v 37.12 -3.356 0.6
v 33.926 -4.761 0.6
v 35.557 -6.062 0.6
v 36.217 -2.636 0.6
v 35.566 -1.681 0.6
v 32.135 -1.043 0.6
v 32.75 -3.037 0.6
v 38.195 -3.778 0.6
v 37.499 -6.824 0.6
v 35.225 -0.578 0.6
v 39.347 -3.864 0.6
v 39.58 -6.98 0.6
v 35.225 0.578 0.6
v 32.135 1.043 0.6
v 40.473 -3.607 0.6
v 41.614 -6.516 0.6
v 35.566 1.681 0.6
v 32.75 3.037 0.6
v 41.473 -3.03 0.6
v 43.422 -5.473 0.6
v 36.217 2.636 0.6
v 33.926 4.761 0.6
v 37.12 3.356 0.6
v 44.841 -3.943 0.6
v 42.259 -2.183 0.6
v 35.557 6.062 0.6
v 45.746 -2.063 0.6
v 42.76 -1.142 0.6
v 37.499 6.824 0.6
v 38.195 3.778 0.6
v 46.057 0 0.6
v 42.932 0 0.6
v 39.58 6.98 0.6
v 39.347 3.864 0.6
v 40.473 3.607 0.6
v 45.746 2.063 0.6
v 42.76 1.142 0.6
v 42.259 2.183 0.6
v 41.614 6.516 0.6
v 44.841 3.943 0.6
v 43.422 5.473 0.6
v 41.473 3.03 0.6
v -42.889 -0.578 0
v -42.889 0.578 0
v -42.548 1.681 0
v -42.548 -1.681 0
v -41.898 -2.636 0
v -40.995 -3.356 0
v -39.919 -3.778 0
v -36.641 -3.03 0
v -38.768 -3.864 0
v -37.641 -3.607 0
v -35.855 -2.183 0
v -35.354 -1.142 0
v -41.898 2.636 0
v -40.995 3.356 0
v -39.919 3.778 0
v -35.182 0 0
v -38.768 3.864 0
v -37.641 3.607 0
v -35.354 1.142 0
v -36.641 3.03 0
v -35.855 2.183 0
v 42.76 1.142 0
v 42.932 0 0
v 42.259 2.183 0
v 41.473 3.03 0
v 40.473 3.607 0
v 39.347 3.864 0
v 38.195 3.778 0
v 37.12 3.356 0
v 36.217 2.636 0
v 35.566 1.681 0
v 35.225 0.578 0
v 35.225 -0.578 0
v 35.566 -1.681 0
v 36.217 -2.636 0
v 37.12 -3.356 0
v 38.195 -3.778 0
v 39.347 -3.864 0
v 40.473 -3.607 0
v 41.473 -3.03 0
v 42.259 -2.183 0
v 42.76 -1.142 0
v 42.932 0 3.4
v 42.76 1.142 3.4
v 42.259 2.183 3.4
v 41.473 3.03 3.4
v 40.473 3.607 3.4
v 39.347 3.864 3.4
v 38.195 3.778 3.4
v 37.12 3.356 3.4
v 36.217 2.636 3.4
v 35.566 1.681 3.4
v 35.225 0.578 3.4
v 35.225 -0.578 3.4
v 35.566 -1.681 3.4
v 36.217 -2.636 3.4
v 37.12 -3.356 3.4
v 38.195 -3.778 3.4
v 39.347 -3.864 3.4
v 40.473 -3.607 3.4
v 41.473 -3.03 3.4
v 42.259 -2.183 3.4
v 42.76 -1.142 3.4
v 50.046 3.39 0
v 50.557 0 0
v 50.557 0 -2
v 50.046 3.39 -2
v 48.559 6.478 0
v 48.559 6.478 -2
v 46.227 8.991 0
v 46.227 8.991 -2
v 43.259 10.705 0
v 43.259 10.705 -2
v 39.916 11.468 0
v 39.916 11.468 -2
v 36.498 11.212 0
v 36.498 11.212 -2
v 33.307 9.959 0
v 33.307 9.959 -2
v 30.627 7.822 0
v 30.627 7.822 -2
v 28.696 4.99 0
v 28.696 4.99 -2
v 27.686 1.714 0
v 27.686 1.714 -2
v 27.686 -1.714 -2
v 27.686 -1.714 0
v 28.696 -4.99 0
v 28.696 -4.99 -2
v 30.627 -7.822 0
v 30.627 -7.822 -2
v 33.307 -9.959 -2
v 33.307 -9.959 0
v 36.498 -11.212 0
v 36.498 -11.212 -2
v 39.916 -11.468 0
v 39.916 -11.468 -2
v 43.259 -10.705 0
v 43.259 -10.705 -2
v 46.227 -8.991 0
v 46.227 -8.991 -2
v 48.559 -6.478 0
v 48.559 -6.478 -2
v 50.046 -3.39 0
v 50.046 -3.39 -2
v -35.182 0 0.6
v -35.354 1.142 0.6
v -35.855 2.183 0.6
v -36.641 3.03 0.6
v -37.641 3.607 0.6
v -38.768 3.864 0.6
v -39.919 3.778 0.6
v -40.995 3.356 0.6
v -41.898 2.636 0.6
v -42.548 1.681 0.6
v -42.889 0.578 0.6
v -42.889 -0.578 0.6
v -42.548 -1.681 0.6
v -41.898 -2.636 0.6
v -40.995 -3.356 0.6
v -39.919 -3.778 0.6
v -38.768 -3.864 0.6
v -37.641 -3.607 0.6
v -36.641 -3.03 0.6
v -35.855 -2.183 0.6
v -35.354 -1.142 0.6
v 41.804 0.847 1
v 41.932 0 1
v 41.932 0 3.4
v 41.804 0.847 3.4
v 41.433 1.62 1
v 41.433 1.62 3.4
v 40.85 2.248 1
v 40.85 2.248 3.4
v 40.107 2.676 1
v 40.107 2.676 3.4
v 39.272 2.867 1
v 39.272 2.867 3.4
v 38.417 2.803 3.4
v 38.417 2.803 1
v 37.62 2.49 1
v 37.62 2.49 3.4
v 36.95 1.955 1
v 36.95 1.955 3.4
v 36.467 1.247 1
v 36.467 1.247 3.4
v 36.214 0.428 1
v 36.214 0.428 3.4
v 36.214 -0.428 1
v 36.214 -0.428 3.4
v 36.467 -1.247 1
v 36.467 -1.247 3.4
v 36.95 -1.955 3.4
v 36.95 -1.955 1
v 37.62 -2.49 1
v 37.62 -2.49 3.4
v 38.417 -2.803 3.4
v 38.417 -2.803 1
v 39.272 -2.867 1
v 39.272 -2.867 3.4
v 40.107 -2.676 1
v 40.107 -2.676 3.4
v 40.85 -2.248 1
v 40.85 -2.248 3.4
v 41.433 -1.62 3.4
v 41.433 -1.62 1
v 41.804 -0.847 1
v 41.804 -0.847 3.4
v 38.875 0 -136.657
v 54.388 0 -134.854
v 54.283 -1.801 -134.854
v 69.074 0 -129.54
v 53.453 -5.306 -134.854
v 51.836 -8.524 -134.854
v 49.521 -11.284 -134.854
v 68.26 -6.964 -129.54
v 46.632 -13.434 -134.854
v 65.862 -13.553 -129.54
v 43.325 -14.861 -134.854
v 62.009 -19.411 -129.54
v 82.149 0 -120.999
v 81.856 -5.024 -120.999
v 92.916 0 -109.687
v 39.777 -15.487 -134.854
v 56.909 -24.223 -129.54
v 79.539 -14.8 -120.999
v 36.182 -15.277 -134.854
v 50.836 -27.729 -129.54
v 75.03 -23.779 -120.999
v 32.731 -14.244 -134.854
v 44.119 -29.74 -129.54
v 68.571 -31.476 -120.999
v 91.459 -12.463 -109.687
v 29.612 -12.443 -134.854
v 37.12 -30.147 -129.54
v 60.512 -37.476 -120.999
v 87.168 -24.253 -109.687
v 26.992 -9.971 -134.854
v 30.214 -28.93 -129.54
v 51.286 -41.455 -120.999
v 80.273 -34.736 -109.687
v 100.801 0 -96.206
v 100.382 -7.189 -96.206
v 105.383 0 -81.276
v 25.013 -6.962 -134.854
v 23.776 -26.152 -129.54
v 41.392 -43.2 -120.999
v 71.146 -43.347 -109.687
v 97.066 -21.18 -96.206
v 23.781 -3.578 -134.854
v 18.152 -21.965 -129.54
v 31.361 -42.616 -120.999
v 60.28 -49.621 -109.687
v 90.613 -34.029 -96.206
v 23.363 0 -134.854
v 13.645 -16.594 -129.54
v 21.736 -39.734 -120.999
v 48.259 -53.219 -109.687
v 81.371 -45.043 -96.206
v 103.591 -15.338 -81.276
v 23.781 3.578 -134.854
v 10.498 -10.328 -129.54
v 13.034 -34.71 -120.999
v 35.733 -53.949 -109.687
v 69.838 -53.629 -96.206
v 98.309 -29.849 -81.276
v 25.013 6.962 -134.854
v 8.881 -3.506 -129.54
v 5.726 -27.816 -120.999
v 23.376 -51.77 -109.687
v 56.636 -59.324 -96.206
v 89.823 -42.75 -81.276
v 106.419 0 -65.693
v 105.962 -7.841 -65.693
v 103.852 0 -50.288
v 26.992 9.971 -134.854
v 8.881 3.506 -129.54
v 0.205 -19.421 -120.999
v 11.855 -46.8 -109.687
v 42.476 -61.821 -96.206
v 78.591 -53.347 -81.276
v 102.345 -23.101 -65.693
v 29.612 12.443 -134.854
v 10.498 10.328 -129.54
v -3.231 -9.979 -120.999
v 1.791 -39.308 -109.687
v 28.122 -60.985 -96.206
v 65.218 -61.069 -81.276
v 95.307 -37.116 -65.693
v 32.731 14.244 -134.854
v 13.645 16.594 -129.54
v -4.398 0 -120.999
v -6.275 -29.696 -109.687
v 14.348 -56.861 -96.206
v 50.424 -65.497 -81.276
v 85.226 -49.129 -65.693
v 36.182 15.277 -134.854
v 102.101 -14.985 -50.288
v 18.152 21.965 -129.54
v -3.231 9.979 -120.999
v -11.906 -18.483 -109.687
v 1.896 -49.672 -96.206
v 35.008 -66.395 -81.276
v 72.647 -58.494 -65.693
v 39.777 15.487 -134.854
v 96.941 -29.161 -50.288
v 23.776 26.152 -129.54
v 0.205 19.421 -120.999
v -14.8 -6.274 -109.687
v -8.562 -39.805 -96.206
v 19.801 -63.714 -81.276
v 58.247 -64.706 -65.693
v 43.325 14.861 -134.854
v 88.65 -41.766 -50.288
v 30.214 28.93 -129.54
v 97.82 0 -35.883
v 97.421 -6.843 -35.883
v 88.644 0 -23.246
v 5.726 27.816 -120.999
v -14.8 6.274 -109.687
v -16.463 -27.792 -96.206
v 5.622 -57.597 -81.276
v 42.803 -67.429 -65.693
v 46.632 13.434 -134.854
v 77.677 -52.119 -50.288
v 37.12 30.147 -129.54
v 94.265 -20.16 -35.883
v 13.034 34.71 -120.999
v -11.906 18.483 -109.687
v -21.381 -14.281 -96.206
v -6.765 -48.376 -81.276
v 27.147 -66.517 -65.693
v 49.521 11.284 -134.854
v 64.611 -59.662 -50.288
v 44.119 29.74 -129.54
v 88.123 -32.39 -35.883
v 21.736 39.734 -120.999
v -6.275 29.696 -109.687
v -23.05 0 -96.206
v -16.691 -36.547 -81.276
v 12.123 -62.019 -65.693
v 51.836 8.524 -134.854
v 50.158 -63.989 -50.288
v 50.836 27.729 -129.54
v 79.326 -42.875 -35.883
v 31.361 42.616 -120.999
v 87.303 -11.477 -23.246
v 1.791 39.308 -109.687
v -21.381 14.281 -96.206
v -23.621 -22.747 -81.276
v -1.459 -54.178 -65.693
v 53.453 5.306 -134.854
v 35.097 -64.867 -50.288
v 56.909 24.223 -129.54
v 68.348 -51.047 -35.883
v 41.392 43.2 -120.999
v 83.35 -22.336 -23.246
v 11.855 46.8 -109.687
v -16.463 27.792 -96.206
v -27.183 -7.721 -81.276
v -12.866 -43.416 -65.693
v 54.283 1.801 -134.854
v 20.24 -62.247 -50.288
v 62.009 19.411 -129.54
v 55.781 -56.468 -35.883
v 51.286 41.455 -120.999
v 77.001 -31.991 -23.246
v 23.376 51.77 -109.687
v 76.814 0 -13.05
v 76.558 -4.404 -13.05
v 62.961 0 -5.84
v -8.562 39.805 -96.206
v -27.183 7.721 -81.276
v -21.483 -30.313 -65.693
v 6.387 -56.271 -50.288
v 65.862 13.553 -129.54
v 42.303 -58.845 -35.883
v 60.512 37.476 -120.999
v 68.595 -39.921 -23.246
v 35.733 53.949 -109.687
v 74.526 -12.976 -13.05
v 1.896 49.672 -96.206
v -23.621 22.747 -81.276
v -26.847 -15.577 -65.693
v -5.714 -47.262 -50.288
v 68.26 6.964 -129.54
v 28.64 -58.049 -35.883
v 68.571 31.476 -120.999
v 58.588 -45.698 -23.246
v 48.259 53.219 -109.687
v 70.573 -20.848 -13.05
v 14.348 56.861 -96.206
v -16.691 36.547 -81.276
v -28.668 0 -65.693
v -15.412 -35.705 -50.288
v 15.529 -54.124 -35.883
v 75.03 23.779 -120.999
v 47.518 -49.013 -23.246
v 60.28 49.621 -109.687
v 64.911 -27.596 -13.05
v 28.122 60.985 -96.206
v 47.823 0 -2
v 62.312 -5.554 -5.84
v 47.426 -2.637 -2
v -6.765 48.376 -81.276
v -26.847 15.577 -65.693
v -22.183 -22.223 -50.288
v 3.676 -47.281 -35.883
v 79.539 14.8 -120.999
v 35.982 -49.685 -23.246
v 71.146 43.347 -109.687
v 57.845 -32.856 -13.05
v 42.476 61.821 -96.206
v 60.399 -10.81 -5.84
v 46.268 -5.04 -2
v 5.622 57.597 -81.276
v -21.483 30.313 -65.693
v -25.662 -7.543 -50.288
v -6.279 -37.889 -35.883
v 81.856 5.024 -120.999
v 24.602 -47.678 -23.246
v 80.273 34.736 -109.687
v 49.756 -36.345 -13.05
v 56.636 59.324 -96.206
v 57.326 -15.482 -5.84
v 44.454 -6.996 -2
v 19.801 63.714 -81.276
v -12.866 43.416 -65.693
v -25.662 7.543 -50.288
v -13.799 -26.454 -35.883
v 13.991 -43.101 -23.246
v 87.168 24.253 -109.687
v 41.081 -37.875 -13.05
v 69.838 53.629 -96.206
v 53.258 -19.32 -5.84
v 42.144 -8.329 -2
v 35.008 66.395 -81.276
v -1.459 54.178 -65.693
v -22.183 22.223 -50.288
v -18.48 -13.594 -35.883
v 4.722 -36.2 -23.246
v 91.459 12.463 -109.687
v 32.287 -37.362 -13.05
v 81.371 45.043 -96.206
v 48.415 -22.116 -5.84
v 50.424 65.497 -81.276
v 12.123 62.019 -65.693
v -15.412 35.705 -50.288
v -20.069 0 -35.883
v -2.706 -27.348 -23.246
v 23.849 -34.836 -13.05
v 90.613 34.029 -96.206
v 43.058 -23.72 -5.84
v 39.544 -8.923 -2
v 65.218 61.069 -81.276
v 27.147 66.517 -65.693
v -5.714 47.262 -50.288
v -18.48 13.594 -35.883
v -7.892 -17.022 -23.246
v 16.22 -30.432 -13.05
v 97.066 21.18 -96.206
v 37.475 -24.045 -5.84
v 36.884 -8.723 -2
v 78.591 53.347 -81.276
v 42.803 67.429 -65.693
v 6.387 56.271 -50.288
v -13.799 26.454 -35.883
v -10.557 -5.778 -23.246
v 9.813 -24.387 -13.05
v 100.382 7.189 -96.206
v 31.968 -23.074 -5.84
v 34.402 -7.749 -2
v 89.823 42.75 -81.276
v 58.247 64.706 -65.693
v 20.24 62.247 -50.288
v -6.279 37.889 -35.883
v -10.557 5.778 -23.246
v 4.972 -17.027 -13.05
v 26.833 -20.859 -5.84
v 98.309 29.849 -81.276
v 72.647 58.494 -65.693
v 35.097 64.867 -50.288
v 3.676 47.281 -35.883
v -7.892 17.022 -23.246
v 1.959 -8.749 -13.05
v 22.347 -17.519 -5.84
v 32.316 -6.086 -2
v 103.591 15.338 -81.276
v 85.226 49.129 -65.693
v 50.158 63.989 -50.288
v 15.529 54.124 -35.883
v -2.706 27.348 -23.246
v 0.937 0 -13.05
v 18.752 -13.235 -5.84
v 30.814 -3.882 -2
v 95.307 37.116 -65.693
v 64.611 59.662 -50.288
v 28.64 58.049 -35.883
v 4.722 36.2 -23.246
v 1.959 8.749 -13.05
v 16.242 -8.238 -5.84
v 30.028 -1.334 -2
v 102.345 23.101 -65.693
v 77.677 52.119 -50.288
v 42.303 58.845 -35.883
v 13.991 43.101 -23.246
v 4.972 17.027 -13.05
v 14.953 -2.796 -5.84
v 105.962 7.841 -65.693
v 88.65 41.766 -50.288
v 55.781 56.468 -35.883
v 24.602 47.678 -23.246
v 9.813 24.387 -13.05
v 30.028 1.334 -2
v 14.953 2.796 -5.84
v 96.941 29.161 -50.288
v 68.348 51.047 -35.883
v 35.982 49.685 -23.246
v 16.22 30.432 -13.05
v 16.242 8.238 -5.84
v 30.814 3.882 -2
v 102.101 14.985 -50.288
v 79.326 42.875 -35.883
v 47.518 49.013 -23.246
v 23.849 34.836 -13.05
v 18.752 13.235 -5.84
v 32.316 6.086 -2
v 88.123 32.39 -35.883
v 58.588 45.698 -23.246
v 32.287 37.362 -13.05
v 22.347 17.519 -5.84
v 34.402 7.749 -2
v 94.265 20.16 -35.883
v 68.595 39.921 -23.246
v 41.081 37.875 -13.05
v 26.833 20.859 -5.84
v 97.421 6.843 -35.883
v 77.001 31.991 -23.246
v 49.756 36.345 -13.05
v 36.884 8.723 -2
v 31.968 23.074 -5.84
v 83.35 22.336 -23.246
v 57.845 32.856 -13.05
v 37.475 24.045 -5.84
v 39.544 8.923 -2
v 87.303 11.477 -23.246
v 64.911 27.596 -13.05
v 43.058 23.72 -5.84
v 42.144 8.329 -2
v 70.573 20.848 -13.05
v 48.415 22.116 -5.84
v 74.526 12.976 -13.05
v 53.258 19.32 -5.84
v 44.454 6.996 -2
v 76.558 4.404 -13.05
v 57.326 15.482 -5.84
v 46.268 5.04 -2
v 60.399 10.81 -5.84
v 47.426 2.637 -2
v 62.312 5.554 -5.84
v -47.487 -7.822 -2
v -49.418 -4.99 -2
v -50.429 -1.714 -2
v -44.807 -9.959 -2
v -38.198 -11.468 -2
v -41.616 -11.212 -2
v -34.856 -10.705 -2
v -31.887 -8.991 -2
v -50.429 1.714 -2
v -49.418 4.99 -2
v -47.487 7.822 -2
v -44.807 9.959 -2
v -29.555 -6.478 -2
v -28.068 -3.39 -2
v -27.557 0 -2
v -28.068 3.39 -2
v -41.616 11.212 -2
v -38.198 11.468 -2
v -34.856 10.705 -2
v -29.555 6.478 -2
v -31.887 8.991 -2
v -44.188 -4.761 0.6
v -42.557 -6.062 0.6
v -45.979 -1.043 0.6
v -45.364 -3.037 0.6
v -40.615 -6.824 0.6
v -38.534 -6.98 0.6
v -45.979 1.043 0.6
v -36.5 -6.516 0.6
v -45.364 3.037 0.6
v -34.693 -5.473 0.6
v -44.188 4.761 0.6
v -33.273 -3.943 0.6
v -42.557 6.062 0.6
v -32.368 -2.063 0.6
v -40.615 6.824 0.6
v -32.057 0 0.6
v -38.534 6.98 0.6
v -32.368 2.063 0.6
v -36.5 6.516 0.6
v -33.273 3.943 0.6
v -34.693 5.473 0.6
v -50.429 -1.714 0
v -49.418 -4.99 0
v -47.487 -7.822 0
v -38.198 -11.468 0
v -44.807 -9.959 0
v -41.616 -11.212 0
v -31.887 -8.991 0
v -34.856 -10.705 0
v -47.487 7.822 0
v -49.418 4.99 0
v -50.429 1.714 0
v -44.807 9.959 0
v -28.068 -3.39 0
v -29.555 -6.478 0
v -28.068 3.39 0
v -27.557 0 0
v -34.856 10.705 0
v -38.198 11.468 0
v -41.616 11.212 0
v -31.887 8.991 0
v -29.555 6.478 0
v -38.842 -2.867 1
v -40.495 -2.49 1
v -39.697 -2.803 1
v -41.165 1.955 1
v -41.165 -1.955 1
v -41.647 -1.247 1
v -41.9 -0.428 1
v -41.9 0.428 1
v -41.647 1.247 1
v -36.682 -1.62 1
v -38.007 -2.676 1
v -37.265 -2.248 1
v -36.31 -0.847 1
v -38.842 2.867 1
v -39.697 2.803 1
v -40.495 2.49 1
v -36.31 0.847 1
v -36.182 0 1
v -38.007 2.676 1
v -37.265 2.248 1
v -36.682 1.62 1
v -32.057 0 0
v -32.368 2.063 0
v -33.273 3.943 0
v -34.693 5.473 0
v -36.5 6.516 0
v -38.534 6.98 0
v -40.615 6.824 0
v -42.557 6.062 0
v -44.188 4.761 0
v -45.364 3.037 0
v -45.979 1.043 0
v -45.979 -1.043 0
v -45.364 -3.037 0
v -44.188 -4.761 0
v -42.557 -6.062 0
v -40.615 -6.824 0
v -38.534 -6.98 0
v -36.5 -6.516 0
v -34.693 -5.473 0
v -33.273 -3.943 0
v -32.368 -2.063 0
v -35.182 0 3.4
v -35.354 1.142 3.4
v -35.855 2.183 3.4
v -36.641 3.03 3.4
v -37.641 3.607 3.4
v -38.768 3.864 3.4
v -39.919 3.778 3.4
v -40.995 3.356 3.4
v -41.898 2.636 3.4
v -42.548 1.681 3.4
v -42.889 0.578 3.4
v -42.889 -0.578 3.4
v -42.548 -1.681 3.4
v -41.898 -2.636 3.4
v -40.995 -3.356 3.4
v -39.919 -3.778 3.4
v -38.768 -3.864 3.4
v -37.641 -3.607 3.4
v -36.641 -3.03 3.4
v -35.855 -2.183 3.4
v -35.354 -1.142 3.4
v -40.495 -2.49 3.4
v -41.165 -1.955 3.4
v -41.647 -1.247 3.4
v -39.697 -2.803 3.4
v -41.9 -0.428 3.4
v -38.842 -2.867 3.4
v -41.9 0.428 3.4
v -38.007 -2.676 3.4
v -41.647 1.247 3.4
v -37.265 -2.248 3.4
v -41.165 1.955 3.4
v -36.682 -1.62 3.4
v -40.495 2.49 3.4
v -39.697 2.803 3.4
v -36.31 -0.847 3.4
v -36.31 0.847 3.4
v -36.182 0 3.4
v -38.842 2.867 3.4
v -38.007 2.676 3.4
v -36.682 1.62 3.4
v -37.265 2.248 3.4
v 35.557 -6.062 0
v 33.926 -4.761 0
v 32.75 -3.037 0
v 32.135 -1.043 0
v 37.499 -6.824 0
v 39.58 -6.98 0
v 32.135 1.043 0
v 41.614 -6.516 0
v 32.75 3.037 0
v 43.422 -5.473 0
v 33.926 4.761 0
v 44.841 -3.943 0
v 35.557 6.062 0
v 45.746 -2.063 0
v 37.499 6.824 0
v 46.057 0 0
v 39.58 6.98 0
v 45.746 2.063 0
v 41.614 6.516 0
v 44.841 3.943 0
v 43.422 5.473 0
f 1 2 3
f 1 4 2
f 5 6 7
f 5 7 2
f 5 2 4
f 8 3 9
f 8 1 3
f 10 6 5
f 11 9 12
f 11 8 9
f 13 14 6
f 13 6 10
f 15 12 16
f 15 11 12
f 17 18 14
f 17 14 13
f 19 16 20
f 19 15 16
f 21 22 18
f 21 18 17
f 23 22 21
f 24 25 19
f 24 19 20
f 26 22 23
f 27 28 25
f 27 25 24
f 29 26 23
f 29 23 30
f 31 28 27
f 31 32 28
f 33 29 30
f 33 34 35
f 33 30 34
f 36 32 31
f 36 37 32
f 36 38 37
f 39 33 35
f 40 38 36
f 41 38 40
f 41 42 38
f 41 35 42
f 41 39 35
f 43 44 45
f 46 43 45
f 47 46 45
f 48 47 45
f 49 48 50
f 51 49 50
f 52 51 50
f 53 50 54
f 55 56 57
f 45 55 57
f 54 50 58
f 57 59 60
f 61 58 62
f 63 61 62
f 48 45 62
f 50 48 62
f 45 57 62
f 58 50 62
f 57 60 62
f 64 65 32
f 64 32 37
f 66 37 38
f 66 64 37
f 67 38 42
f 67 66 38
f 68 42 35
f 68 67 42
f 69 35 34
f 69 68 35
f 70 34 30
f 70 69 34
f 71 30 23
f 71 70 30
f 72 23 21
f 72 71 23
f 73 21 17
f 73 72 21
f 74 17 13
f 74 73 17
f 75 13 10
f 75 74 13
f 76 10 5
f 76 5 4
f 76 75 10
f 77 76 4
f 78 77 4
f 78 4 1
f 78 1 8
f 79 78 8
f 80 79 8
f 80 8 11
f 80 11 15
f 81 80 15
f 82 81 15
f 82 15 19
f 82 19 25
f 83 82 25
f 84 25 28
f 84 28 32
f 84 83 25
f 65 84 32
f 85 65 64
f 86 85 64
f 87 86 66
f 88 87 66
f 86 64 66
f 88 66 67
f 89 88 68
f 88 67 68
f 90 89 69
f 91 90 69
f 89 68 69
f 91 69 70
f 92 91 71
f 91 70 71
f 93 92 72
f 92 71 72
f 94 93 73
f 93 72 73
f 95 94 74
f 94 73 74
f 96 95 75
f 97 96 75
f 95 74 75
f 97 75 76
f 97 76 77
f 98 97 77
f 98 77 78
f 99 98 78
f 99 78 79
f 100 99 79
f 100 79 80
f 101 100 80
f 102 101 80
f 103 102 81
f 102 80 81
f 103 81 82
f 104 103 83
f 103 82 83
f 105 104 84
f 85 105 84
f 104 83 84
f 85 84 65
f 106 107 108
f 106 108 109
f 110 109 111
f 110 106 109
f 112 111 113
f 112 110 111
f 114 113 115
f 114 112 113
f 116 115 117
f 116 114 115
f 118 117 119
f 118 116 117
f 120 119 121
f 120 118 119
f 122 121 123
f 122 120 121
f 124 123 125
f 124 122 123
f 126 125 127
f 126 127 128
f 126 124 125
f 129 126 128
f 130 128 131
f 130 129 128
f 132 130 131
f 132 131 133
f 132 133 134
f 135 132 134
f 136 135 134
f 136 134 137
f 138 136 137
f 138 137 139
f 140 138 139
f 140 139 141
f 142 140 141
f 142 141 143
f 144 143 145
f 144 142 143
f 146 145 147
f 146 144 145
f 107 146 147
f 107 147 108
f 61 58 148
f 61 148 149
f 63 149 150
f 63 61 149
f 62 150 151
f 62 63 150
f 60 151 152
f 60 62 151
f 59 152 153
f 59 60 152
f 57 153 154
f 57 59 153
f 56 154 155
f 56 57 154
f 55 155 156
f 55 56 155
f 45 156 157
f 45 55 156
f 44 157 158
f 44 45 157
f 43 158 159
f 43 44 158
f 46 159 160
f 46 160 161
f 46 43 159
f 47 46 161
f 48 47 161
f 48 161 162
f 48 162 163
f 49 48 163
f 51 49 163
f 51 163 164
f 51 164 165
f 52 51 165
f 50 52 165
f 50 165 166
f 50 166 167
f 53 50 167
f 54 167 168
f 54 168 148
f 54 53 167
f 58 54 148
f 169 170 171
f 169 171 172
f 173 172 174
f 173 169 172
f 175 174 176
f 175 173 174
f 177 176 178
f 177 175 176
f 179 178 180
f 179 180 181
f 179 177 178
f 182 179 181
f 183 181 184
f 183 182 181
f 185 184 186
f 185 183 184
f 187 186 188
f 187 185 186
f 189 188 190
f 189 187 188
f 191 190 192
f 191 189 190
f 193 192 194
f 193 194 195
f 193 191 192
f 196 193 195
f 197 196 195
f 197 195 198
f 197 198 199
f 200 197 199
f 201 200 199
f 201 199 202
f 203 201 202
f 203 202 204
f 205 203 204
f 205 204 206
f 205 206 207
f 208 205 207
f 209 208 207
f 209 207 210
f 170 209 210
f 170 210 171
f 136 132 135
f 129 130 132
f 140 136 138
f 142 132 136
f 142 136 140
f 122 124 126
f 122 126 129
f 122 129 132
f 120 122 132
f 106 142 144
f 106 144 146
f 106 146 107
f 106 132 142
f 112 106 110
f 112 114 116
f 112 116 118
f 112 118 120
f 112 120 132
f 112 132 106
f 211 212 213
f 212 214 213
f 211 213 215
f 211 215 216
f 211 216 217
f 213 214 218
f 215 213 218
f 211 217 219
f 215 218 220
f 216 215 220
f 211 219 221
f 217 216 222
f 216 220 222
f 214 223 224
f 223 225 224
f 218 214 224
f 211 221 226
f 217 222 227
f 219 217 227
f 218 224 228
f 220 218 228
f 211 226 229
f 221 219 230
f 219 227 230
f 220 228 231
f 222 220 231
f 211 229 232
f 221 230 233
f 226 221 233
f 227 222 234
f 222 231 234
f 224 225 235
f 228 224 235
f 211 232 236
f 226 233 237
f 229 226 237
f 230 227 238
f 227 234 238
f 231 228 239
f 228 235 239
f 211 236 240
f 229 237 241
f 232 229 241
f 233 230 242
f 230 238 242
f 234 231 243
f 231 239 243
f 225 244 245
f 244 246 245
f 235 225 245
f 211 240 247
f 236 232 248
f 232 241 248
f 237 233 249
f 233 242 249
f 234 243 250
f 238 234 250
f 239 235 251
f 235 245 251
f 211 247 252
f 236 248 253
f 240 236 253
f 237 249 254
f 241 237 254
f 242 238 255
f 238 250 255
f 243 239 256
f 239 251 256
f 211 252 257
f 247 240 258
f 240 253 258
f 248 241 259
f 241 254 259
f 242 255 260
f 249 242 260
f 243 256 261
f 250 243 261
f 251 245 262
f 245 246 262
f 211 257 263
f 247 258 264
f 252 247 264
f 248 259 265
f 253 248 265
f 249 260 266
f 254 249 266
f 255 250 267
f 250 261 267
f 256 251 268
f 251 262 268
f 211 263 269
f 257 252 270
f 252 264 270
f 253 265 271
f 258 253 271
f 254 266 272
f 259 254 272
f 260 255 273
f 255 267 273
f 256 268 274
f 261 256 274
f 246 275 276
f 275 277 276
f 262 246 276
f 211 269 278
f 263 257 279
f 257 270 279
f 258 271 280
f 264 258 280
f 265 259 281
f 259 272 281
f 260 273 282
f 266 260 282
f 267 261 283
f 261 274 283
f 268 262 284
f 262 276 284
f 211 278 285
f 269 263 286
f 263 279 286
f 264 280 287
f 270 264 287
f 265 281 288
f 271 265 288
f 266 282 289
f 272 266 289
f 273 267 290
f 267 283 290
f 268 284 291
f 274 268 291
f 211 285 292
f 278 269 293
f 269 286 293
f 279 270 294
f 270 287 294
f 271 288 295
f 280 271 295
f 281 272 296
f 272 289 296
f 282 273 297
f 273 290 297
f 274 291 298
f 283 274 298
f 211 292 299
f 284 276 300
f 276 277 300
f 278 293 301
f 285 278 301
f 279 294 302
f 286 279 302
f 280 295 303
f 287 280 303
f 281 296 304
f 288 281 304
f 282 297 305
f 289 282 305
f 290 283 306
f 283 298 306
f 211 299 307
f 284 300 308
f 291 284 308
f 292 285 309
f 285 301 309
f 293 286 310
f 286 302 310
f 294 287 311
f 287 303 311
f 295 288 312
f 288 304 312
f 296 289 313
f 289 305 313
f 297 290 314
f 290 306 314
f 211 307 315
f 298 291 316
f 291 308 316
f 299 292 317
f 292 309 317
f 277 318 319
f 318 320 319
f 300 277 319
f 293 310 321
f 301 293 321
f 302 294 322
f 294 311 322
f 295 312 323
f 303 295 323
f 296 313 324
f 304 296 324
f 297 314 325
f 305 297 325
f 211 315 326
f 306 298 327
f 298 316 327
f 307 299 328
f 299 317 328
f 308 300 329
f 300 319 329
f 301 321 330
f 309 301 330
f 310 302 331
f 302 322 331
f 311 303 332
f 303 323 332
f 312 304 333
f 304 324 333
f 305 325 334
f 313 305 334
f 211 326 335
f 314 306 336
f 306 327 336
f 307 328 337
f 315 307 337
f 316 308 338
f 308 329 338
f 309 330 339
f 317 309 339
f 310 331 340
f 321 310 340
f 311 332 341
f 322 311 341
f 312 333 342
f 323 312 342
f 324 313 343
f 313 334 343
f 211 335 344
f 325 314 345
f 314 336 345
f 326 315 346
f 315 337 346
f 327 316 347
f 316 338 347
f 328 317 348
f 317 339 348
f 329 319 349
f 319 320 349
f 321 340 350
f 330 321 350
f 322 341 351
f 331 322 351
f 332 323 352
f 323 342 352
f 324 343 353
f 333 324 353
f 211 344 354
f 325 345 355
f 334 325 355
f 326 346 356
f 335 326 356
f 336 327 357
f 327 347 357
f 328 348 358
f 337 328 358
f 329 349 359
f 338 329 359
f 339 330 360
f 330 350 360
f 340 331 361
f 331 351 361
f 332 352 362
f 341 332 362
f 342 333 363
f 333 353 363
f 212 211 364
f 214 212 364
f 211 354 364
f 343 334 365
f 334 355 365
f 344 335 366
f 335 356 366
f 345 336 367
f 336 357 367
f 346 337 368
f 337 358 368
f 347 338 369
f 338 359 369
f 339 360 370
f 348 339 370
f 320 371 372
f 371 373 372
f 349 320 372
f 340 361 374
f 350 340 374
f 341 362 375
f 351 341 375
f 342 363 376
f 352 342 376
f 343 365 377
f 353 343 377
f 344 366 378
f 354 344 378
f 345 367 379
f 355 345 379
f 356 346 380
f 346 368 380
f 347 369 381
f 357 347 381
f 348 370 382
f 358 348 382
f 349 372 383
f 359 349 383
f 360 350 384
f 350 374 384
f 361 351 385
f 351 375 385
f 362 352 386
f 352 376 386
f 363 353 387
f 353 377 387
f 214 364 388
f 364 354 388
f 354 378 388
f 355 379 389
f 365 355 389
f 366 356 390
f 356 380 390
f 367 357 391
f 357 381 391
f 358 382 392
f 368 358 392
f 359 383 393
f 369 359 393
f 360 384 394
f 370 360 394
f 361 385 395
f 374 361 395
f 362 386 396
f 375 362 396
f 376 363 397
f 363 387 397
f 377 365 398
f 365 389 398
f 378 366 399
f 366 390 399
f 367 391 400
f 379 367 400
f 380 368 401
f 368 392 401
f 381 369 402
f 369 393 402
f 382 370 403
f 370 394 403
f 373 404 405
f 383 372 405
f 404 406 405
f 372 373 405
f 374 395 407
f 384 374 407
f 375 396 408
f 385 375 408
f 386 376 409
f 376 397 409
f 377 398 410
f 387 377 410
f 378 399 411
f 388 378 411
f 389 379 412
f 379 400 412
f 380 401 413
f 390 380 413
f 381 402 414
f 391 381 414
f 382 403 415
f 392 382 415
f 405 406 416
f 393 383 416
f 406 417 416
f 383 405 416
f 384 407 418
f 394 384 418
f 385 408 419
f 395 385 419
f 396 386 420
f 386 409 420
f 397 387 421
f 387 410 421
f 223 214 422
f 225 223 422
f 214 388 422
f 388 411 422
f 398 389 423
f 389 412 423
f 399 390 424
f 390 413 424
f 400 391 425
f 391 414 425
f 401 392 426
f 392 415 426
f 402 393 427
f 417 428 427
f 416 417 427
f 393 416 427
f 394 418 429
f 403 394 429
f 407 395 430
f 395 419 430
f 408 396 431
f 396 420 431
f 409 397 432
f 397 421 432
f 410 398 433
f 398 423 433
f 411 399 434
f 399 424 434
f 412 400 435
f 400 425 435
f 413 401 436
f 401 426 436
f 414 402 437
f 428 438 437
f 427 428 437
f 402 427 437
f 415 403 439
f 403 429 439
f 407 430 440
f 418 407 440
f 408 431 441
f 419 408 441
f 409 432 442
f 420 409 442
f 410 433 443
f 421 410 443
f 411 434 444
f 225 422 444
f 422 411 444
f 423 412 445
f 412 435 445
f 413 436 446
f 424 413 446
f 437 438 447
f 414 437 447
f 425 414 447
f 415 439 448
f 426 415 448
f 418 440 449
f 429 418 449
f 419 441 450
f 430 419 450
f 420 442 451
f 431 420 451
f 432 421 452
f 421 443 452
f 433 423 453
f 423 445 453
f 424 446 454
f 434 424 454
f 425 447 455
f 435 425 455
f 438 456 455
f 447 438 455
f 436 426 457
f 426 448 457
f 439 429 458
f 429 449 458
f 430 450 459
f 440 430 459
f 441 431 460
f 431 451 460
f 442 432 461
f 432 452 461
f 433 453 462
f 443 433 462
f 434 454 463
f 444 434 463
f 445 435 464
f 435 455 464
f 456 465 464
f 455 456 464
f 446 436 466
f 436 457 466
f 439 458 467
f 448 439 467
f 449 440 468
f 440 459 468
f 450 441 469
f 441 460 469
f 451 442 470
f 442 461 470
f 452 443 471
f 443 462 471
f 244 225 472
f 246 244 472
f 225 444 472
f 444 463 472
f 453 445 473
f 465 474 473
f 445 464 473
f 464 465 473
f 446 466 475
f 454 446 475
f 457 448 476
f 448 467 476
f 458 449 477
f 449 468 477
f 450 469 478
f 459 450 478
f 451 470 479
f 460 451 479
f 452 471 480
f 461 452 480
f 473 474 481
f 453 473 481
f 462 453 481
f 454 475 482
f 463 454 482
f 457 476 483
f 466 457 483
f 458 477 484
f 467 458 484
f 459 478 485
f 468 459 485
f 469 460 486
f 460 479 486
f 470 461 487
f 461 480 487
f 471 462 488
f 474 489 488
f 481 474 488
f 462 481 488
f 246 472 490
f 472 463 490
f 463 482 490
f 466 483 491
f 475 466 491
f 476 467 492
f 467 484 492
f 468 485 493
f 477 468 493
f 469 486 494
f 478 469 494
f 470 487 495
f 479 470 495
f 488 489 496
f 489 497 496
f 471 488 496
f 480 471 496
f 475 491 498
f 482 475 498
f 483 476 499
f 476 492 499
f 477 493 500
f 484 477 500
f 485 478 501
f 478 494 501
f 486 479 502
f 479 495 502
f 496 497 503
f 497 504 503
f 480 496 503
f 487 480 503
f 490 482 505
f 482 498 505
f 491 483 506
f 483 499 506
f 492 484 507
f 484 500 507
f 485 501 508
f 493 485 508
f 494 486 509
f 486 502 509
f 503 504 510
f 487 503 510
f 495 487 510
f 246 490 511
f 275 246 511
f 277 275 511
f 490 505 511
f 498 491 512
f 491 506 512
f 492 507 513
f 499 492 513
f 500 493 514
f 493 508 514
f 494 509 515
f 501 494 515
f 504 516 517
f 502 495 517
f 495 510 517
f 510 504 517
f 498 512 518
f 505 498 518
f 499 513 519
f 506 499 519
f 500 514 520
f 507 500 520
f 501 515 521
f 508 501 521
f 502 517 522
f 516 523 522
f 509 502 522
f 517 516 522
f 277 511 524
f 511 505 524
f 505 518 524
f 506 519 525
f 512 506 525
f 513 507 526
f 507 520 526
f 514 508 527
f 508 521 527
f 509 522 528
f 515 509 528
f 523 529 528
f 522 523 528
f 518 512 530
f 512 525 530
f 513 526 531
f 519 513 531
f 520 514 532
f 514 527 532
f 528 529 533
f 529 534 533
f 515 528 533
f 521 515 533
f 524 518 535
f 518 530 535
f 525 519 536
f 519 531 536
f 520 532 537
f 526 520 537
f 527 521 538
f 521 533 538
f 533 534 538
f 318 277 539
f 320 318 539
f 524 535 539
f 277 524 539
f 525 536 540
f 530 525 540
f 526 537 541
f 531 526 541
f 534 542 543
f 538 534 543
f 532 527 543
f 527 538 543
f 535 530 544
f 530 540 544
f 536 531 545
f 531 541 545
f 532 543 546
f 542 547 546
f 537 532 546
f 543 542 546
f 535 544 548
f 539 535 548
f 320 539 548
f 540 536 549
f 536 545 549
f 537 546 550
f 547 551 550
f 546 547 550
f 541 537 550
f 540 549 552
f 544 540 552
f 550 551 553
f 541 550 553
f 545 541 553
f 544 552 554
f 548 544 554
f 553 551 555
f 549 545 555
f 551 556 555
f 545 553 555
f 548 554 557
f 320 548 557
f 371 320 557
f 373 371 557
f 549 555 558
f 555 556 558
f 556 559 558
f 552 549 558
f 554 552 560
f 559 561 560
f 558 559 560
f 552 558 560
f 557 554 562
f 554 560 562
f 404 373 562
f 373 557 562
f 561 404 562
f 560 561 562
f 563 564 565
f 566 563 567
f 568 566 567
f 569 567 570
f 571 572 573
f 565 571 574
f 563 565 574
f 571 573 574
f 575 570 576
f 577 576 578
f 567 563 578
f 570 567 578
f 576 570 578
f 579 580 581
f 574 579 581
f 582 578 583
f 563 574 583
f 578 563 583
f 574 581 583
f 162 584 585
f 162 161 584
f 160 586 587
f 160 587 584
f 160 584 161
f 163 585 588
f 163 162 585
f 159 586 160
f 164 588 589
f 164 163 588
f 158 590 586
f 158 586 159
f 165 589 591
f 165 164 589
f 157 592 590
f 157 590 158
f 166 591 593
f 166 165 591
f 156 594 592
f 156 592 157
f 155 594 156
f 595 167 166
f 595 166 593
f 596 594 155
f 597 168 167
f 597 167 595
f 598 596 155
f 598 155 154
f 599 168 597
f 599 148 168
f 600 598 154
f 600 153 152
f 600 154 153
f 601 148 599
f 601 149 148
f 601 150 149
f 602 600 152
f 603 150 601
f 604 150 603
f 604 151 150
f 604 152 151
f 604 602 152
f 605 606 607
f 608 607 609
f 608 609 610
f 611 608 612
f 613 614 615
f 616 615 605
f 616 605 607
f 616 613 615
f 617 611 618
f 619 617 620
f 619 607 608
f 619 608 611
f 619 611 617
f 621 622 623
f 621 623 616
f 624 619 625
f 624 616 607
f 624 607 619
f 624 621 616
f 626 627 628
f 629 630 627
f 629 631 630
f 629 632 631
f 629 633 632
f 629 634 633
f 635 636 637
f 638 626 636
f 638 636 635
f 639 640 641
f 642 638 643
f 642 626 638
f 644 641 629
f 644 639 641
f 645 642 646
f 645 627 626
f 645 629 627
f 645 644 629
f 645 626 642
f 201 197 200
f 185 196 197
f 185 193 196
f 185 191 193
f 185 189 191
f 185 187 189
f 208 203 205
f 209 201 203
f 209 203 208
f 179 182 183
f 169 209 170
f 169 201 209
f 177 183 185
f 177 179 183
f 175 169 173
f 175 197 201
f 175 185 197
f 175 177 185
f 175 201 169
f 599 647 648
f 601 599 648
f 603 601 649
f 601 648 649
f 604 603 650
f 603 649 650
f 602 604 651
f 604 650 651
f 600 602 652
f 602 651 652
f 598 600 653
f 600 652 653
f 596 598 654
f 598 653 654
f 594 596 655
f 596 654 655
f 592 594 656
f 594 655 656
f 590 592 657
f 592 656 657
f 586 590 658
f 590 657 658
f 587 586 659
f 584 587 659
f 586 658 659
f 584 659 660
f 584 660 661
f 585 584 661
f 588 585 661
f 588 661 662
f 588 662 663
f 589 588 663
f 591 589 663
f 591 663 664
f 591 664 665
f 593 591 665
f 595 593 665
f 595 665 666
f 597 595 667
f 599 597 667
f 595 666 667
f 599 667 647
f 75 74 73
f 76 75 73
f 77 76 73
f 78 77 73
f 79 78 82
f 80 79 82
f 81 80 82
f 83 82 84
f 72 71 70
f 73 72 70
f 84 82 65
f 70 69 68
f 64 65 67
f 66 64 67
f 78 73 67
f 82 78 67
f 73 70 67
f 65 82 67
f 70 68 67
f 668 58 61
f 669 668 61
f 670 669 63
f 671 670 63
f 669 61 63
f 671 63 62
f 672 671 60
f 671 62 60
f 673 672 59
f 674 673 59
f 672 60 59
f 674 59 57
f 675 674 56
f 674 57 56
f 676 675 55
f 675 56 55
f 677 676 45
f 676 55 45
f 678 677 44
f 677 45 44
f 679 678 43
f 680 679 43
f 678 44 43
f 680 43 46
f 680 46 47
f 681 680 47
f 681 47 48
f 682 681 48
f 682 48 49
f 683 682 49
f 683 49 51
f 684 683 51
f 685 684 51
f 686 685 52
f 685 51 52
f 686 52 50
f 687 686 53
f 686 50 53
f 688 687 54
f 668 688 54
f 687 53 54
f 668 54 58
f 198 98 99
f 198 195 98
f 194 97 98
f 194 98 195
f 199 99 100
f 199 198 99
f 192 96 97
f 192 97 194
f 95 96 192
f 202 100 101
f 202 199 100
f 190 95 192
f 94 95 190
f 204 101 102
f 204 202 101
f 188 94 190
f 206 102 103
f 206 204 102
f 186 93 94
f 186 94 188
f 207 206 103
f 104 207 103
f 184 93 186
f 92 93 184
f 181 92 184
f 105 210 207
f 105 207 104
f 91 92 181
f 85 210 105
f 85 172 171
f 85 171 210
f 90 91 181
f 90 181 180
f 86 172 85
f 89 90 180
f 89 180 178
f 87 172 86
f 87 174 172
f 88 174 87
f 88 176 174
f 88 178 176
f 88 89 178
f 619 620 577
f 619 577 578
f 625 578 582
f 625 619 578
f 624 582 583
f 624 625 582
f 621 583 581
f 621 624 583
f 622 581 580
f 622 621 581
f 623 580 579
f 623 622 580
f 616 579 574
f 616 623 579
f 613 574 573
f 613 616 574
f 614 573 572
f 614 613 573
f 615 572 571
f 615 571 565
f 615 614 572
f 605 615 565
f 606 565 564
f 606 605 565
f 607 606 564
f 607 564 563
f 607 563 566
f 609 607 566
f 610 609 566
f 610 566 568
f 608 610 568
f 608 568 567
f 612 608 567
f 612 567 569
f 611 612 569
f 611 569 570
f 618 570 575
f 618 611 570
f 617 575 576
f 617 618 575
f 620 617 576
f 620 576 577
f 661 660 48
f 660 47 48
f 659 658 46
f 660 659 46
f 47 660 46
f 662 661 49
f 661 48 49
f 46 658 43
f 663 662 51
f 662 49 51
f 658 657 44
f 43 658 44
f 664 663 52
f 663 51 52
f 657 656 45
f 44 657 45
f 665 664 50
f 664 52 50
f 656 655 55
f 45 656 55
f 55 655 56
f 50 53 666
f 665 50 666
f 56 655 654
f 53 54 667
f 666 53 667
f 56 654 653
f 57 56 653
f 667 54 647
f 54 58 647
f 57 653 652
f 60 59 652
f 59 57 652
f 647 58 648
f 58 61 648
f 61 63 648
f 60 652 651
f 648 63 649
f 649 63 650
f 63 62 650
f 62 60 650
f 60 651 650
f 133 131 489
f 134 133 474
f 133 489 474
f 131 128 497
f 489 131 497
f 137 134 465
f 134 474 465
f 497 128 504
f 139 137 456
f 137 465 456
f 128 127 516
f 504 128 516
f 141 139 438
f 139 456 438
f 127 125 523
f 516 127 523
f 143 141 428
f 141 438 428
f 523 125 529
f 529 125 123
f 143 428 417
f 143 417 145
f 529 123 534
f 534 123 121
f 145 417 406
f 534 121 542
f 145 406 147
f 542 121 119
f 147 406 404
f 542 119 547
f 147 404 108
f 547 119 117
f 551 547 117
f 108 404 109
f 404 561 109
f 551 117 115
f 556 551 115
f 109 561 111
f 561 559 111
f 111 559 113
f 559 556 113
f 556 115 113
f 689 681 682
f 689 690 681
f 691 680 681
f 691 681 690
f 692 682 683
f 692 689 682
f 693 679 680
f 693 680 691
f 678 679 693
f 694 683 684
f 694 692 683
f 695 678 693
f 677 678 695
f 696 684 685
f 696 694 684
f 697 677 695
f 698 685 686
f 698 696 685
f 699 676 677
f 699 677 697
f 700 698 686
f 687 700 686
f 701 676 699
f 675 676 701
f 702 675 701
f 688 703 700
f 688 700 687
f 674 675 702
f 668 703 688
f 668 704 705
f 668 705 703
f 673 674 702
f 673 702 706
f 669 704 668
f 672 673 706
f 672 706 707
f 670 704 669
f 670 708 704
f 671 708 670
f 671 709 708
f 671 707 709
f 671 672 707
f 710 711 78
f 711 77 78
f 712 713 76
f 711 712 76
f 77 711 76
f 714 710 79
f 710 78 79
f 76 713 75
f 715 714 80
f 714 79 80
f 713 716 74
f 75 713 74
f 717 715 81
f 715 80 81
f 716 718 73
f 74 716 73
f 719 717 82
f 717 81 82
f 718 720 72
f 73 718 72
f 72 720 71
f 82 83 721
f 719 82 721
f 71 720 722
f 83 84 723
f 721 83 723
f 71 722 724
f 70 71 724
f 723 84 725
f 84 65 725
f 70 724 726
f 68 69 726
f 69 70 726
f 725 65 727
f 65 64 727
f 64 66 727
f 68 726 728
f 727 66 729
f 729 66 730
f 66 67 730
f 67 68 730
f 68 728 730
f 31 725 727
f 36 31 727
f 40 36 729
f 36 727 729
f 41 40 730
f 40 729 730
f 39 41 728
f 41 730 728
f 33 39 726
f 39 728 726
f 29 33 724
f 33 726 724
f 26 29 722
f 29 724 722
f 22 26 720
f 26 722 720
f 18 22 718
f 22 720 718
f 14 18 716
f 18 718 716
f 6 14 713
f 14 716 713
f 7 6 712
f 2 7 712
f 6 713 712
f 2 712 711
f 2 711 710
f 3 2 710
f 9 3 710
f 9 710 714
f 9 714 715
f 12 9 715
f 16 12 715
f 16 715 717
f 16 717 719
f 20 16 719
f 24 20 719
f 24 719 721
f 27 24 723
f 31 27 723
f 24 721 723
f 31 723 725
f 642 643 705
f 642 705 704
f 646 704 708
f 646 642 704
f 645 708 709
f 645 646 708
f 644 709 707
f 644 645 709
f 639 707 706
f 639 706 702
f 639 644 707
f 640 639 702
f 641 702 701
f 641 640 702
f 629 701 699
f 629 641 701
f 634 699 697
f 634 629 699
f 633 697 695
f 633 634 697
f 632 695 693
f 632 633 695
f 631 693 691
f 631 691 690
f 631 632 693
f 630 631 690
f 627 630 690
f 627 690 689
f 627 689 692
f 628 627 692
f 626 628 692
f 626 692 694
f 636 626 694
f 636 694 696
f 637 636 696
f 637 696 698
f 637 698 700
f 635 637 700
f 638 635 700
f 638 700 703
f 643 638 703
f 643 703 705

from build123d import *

# Parameters (mm, degrees)
F0_R     = 3.875
F1_DEPTH = 3.4
F0_R_2   = 7
F2_DEPTH = 0.6
F0_R_3   = 11.5
F3_DEPTH = 2
F4_T     = -1
F4_2_T   = -1


with BuildPart() as f1:
    # F0 (on Top) → F1 (new body)
    with BuildSketch(Plane.XY):
        with Locations((-39.0570946038, 0)):
            Circle(F0_R)
    extrude(amount=F1_DEPTH)

    # F4
    f4_openings = [f1.faces().sort_by_distance(p)[0] for p in [
        (-39.057095, 0, 3.4),
    ]]
    offset(amount=F4_T, openings=f4_openings)


with BuildPart() as f1b:
    # F0 (on Top) → F1, piece 2 (new body)
    with BuildSketch(Plane.XY):
        with Locations((39.0570946038, 0)):
            Circle(F0_R)
    extrude(amount=F1_DEPTH)

    # F4#2
    f4_2_openings = [f1b.faces().sort_by_distance(p)[0] for p in [
        (39.057095, 0, 3.4),
    ]]
    offset(amount=F4_2_T, openings=f4_2_openings)


with BuildPart() as f2:
    # F0 (on Top) → F2 (new body)
    with BuildSketch(Plane.XY):
        with Locations((-39.0570946038, 0)):
            Circle(F0_R_2)
        with Locations((-39.0570946038, 0)):
            Circle(F0_R, mode=Mode.SUBTRACT)
    extrude(amount=F2_DEPTH)


with BuildPart() as f2b:
    # F0 (on Top) → F2, piece 2 (new body)
    with BuildSketch(Plane.XY):
        with Locations((39.0570946038, 0)):
            Circle(F0_R_2)
        with Locations((39.0570946038, 0)):
            Circle(F0_R, mode=Mode.SUBTRACT)
    extrude(amount=F2_DEPTH)


with BuildPart() as f3:
    # F0 (on Top) → F3 (new body)
    with BuildSketch(Plane.XY):
        with Locations((-39.0570946038, 0)):
            Circle(F0_R_3)
        with Locations((-39.0570946038, 0)):
            Circle(F0_R_2, mode=Mode.SUBTRACT)
        with Locations((-39.0570946038, 0)):
            Circle(F0_R_2)
        with Locations((-39.0570946038, 0)):
            Circle(F0_R, mode=Mode.SUBTRACT)
        with Locations((-39.0570946038, 0)):
            Circle(F0_R)
    extrude(amount=-F3_DEPTH)


with BuildPart() as f3b:
    # F0 (on Top) → F3, piece 2 (new body)
    with BuildSketch(Plane.XY):
        with Locations((39.0570946038, 0)):
            Circle(F0_R_3)
        with Locations((39.0570946038, 0)):
            Circle(F0_R_2, mode=Mode.SUBTRACT)
        with Locations((39.0570946038, 0)):
            Circle(F0_R_2)
        with Locations((39.0570946038, 0)):
            Circle(F0_R, mode=Mode.SUBTRACT)
        with Locations((39.0570946038, 0)):
            Circle(F0_R)
    extrude(amount=-F3_DEPTH)

    # F5 (on Front) → F6 (revolve)
    with BuildSketch(Plane.XZ):
        with BuildLine():
            Line((38.8754345477, -69.0311416984), (38.8754345477, -136.6568365187))
            ThreePointArc((38.8754345477, -136.6568365187), (106.501129368, -69.0311416984), (38.8754345477, -1.405446878))
            Line((38.8754345477, -1.405446878), (38.8754345477, -69.0311416984))
        make_face()
    revolve(axis=Axis((38.8754345477, 0, -102.8439891085), (0, 0, -1)))


solid = Compound([f1.part, f1b.part, f2.part, f2b.part, f3.part, f3b.part])
